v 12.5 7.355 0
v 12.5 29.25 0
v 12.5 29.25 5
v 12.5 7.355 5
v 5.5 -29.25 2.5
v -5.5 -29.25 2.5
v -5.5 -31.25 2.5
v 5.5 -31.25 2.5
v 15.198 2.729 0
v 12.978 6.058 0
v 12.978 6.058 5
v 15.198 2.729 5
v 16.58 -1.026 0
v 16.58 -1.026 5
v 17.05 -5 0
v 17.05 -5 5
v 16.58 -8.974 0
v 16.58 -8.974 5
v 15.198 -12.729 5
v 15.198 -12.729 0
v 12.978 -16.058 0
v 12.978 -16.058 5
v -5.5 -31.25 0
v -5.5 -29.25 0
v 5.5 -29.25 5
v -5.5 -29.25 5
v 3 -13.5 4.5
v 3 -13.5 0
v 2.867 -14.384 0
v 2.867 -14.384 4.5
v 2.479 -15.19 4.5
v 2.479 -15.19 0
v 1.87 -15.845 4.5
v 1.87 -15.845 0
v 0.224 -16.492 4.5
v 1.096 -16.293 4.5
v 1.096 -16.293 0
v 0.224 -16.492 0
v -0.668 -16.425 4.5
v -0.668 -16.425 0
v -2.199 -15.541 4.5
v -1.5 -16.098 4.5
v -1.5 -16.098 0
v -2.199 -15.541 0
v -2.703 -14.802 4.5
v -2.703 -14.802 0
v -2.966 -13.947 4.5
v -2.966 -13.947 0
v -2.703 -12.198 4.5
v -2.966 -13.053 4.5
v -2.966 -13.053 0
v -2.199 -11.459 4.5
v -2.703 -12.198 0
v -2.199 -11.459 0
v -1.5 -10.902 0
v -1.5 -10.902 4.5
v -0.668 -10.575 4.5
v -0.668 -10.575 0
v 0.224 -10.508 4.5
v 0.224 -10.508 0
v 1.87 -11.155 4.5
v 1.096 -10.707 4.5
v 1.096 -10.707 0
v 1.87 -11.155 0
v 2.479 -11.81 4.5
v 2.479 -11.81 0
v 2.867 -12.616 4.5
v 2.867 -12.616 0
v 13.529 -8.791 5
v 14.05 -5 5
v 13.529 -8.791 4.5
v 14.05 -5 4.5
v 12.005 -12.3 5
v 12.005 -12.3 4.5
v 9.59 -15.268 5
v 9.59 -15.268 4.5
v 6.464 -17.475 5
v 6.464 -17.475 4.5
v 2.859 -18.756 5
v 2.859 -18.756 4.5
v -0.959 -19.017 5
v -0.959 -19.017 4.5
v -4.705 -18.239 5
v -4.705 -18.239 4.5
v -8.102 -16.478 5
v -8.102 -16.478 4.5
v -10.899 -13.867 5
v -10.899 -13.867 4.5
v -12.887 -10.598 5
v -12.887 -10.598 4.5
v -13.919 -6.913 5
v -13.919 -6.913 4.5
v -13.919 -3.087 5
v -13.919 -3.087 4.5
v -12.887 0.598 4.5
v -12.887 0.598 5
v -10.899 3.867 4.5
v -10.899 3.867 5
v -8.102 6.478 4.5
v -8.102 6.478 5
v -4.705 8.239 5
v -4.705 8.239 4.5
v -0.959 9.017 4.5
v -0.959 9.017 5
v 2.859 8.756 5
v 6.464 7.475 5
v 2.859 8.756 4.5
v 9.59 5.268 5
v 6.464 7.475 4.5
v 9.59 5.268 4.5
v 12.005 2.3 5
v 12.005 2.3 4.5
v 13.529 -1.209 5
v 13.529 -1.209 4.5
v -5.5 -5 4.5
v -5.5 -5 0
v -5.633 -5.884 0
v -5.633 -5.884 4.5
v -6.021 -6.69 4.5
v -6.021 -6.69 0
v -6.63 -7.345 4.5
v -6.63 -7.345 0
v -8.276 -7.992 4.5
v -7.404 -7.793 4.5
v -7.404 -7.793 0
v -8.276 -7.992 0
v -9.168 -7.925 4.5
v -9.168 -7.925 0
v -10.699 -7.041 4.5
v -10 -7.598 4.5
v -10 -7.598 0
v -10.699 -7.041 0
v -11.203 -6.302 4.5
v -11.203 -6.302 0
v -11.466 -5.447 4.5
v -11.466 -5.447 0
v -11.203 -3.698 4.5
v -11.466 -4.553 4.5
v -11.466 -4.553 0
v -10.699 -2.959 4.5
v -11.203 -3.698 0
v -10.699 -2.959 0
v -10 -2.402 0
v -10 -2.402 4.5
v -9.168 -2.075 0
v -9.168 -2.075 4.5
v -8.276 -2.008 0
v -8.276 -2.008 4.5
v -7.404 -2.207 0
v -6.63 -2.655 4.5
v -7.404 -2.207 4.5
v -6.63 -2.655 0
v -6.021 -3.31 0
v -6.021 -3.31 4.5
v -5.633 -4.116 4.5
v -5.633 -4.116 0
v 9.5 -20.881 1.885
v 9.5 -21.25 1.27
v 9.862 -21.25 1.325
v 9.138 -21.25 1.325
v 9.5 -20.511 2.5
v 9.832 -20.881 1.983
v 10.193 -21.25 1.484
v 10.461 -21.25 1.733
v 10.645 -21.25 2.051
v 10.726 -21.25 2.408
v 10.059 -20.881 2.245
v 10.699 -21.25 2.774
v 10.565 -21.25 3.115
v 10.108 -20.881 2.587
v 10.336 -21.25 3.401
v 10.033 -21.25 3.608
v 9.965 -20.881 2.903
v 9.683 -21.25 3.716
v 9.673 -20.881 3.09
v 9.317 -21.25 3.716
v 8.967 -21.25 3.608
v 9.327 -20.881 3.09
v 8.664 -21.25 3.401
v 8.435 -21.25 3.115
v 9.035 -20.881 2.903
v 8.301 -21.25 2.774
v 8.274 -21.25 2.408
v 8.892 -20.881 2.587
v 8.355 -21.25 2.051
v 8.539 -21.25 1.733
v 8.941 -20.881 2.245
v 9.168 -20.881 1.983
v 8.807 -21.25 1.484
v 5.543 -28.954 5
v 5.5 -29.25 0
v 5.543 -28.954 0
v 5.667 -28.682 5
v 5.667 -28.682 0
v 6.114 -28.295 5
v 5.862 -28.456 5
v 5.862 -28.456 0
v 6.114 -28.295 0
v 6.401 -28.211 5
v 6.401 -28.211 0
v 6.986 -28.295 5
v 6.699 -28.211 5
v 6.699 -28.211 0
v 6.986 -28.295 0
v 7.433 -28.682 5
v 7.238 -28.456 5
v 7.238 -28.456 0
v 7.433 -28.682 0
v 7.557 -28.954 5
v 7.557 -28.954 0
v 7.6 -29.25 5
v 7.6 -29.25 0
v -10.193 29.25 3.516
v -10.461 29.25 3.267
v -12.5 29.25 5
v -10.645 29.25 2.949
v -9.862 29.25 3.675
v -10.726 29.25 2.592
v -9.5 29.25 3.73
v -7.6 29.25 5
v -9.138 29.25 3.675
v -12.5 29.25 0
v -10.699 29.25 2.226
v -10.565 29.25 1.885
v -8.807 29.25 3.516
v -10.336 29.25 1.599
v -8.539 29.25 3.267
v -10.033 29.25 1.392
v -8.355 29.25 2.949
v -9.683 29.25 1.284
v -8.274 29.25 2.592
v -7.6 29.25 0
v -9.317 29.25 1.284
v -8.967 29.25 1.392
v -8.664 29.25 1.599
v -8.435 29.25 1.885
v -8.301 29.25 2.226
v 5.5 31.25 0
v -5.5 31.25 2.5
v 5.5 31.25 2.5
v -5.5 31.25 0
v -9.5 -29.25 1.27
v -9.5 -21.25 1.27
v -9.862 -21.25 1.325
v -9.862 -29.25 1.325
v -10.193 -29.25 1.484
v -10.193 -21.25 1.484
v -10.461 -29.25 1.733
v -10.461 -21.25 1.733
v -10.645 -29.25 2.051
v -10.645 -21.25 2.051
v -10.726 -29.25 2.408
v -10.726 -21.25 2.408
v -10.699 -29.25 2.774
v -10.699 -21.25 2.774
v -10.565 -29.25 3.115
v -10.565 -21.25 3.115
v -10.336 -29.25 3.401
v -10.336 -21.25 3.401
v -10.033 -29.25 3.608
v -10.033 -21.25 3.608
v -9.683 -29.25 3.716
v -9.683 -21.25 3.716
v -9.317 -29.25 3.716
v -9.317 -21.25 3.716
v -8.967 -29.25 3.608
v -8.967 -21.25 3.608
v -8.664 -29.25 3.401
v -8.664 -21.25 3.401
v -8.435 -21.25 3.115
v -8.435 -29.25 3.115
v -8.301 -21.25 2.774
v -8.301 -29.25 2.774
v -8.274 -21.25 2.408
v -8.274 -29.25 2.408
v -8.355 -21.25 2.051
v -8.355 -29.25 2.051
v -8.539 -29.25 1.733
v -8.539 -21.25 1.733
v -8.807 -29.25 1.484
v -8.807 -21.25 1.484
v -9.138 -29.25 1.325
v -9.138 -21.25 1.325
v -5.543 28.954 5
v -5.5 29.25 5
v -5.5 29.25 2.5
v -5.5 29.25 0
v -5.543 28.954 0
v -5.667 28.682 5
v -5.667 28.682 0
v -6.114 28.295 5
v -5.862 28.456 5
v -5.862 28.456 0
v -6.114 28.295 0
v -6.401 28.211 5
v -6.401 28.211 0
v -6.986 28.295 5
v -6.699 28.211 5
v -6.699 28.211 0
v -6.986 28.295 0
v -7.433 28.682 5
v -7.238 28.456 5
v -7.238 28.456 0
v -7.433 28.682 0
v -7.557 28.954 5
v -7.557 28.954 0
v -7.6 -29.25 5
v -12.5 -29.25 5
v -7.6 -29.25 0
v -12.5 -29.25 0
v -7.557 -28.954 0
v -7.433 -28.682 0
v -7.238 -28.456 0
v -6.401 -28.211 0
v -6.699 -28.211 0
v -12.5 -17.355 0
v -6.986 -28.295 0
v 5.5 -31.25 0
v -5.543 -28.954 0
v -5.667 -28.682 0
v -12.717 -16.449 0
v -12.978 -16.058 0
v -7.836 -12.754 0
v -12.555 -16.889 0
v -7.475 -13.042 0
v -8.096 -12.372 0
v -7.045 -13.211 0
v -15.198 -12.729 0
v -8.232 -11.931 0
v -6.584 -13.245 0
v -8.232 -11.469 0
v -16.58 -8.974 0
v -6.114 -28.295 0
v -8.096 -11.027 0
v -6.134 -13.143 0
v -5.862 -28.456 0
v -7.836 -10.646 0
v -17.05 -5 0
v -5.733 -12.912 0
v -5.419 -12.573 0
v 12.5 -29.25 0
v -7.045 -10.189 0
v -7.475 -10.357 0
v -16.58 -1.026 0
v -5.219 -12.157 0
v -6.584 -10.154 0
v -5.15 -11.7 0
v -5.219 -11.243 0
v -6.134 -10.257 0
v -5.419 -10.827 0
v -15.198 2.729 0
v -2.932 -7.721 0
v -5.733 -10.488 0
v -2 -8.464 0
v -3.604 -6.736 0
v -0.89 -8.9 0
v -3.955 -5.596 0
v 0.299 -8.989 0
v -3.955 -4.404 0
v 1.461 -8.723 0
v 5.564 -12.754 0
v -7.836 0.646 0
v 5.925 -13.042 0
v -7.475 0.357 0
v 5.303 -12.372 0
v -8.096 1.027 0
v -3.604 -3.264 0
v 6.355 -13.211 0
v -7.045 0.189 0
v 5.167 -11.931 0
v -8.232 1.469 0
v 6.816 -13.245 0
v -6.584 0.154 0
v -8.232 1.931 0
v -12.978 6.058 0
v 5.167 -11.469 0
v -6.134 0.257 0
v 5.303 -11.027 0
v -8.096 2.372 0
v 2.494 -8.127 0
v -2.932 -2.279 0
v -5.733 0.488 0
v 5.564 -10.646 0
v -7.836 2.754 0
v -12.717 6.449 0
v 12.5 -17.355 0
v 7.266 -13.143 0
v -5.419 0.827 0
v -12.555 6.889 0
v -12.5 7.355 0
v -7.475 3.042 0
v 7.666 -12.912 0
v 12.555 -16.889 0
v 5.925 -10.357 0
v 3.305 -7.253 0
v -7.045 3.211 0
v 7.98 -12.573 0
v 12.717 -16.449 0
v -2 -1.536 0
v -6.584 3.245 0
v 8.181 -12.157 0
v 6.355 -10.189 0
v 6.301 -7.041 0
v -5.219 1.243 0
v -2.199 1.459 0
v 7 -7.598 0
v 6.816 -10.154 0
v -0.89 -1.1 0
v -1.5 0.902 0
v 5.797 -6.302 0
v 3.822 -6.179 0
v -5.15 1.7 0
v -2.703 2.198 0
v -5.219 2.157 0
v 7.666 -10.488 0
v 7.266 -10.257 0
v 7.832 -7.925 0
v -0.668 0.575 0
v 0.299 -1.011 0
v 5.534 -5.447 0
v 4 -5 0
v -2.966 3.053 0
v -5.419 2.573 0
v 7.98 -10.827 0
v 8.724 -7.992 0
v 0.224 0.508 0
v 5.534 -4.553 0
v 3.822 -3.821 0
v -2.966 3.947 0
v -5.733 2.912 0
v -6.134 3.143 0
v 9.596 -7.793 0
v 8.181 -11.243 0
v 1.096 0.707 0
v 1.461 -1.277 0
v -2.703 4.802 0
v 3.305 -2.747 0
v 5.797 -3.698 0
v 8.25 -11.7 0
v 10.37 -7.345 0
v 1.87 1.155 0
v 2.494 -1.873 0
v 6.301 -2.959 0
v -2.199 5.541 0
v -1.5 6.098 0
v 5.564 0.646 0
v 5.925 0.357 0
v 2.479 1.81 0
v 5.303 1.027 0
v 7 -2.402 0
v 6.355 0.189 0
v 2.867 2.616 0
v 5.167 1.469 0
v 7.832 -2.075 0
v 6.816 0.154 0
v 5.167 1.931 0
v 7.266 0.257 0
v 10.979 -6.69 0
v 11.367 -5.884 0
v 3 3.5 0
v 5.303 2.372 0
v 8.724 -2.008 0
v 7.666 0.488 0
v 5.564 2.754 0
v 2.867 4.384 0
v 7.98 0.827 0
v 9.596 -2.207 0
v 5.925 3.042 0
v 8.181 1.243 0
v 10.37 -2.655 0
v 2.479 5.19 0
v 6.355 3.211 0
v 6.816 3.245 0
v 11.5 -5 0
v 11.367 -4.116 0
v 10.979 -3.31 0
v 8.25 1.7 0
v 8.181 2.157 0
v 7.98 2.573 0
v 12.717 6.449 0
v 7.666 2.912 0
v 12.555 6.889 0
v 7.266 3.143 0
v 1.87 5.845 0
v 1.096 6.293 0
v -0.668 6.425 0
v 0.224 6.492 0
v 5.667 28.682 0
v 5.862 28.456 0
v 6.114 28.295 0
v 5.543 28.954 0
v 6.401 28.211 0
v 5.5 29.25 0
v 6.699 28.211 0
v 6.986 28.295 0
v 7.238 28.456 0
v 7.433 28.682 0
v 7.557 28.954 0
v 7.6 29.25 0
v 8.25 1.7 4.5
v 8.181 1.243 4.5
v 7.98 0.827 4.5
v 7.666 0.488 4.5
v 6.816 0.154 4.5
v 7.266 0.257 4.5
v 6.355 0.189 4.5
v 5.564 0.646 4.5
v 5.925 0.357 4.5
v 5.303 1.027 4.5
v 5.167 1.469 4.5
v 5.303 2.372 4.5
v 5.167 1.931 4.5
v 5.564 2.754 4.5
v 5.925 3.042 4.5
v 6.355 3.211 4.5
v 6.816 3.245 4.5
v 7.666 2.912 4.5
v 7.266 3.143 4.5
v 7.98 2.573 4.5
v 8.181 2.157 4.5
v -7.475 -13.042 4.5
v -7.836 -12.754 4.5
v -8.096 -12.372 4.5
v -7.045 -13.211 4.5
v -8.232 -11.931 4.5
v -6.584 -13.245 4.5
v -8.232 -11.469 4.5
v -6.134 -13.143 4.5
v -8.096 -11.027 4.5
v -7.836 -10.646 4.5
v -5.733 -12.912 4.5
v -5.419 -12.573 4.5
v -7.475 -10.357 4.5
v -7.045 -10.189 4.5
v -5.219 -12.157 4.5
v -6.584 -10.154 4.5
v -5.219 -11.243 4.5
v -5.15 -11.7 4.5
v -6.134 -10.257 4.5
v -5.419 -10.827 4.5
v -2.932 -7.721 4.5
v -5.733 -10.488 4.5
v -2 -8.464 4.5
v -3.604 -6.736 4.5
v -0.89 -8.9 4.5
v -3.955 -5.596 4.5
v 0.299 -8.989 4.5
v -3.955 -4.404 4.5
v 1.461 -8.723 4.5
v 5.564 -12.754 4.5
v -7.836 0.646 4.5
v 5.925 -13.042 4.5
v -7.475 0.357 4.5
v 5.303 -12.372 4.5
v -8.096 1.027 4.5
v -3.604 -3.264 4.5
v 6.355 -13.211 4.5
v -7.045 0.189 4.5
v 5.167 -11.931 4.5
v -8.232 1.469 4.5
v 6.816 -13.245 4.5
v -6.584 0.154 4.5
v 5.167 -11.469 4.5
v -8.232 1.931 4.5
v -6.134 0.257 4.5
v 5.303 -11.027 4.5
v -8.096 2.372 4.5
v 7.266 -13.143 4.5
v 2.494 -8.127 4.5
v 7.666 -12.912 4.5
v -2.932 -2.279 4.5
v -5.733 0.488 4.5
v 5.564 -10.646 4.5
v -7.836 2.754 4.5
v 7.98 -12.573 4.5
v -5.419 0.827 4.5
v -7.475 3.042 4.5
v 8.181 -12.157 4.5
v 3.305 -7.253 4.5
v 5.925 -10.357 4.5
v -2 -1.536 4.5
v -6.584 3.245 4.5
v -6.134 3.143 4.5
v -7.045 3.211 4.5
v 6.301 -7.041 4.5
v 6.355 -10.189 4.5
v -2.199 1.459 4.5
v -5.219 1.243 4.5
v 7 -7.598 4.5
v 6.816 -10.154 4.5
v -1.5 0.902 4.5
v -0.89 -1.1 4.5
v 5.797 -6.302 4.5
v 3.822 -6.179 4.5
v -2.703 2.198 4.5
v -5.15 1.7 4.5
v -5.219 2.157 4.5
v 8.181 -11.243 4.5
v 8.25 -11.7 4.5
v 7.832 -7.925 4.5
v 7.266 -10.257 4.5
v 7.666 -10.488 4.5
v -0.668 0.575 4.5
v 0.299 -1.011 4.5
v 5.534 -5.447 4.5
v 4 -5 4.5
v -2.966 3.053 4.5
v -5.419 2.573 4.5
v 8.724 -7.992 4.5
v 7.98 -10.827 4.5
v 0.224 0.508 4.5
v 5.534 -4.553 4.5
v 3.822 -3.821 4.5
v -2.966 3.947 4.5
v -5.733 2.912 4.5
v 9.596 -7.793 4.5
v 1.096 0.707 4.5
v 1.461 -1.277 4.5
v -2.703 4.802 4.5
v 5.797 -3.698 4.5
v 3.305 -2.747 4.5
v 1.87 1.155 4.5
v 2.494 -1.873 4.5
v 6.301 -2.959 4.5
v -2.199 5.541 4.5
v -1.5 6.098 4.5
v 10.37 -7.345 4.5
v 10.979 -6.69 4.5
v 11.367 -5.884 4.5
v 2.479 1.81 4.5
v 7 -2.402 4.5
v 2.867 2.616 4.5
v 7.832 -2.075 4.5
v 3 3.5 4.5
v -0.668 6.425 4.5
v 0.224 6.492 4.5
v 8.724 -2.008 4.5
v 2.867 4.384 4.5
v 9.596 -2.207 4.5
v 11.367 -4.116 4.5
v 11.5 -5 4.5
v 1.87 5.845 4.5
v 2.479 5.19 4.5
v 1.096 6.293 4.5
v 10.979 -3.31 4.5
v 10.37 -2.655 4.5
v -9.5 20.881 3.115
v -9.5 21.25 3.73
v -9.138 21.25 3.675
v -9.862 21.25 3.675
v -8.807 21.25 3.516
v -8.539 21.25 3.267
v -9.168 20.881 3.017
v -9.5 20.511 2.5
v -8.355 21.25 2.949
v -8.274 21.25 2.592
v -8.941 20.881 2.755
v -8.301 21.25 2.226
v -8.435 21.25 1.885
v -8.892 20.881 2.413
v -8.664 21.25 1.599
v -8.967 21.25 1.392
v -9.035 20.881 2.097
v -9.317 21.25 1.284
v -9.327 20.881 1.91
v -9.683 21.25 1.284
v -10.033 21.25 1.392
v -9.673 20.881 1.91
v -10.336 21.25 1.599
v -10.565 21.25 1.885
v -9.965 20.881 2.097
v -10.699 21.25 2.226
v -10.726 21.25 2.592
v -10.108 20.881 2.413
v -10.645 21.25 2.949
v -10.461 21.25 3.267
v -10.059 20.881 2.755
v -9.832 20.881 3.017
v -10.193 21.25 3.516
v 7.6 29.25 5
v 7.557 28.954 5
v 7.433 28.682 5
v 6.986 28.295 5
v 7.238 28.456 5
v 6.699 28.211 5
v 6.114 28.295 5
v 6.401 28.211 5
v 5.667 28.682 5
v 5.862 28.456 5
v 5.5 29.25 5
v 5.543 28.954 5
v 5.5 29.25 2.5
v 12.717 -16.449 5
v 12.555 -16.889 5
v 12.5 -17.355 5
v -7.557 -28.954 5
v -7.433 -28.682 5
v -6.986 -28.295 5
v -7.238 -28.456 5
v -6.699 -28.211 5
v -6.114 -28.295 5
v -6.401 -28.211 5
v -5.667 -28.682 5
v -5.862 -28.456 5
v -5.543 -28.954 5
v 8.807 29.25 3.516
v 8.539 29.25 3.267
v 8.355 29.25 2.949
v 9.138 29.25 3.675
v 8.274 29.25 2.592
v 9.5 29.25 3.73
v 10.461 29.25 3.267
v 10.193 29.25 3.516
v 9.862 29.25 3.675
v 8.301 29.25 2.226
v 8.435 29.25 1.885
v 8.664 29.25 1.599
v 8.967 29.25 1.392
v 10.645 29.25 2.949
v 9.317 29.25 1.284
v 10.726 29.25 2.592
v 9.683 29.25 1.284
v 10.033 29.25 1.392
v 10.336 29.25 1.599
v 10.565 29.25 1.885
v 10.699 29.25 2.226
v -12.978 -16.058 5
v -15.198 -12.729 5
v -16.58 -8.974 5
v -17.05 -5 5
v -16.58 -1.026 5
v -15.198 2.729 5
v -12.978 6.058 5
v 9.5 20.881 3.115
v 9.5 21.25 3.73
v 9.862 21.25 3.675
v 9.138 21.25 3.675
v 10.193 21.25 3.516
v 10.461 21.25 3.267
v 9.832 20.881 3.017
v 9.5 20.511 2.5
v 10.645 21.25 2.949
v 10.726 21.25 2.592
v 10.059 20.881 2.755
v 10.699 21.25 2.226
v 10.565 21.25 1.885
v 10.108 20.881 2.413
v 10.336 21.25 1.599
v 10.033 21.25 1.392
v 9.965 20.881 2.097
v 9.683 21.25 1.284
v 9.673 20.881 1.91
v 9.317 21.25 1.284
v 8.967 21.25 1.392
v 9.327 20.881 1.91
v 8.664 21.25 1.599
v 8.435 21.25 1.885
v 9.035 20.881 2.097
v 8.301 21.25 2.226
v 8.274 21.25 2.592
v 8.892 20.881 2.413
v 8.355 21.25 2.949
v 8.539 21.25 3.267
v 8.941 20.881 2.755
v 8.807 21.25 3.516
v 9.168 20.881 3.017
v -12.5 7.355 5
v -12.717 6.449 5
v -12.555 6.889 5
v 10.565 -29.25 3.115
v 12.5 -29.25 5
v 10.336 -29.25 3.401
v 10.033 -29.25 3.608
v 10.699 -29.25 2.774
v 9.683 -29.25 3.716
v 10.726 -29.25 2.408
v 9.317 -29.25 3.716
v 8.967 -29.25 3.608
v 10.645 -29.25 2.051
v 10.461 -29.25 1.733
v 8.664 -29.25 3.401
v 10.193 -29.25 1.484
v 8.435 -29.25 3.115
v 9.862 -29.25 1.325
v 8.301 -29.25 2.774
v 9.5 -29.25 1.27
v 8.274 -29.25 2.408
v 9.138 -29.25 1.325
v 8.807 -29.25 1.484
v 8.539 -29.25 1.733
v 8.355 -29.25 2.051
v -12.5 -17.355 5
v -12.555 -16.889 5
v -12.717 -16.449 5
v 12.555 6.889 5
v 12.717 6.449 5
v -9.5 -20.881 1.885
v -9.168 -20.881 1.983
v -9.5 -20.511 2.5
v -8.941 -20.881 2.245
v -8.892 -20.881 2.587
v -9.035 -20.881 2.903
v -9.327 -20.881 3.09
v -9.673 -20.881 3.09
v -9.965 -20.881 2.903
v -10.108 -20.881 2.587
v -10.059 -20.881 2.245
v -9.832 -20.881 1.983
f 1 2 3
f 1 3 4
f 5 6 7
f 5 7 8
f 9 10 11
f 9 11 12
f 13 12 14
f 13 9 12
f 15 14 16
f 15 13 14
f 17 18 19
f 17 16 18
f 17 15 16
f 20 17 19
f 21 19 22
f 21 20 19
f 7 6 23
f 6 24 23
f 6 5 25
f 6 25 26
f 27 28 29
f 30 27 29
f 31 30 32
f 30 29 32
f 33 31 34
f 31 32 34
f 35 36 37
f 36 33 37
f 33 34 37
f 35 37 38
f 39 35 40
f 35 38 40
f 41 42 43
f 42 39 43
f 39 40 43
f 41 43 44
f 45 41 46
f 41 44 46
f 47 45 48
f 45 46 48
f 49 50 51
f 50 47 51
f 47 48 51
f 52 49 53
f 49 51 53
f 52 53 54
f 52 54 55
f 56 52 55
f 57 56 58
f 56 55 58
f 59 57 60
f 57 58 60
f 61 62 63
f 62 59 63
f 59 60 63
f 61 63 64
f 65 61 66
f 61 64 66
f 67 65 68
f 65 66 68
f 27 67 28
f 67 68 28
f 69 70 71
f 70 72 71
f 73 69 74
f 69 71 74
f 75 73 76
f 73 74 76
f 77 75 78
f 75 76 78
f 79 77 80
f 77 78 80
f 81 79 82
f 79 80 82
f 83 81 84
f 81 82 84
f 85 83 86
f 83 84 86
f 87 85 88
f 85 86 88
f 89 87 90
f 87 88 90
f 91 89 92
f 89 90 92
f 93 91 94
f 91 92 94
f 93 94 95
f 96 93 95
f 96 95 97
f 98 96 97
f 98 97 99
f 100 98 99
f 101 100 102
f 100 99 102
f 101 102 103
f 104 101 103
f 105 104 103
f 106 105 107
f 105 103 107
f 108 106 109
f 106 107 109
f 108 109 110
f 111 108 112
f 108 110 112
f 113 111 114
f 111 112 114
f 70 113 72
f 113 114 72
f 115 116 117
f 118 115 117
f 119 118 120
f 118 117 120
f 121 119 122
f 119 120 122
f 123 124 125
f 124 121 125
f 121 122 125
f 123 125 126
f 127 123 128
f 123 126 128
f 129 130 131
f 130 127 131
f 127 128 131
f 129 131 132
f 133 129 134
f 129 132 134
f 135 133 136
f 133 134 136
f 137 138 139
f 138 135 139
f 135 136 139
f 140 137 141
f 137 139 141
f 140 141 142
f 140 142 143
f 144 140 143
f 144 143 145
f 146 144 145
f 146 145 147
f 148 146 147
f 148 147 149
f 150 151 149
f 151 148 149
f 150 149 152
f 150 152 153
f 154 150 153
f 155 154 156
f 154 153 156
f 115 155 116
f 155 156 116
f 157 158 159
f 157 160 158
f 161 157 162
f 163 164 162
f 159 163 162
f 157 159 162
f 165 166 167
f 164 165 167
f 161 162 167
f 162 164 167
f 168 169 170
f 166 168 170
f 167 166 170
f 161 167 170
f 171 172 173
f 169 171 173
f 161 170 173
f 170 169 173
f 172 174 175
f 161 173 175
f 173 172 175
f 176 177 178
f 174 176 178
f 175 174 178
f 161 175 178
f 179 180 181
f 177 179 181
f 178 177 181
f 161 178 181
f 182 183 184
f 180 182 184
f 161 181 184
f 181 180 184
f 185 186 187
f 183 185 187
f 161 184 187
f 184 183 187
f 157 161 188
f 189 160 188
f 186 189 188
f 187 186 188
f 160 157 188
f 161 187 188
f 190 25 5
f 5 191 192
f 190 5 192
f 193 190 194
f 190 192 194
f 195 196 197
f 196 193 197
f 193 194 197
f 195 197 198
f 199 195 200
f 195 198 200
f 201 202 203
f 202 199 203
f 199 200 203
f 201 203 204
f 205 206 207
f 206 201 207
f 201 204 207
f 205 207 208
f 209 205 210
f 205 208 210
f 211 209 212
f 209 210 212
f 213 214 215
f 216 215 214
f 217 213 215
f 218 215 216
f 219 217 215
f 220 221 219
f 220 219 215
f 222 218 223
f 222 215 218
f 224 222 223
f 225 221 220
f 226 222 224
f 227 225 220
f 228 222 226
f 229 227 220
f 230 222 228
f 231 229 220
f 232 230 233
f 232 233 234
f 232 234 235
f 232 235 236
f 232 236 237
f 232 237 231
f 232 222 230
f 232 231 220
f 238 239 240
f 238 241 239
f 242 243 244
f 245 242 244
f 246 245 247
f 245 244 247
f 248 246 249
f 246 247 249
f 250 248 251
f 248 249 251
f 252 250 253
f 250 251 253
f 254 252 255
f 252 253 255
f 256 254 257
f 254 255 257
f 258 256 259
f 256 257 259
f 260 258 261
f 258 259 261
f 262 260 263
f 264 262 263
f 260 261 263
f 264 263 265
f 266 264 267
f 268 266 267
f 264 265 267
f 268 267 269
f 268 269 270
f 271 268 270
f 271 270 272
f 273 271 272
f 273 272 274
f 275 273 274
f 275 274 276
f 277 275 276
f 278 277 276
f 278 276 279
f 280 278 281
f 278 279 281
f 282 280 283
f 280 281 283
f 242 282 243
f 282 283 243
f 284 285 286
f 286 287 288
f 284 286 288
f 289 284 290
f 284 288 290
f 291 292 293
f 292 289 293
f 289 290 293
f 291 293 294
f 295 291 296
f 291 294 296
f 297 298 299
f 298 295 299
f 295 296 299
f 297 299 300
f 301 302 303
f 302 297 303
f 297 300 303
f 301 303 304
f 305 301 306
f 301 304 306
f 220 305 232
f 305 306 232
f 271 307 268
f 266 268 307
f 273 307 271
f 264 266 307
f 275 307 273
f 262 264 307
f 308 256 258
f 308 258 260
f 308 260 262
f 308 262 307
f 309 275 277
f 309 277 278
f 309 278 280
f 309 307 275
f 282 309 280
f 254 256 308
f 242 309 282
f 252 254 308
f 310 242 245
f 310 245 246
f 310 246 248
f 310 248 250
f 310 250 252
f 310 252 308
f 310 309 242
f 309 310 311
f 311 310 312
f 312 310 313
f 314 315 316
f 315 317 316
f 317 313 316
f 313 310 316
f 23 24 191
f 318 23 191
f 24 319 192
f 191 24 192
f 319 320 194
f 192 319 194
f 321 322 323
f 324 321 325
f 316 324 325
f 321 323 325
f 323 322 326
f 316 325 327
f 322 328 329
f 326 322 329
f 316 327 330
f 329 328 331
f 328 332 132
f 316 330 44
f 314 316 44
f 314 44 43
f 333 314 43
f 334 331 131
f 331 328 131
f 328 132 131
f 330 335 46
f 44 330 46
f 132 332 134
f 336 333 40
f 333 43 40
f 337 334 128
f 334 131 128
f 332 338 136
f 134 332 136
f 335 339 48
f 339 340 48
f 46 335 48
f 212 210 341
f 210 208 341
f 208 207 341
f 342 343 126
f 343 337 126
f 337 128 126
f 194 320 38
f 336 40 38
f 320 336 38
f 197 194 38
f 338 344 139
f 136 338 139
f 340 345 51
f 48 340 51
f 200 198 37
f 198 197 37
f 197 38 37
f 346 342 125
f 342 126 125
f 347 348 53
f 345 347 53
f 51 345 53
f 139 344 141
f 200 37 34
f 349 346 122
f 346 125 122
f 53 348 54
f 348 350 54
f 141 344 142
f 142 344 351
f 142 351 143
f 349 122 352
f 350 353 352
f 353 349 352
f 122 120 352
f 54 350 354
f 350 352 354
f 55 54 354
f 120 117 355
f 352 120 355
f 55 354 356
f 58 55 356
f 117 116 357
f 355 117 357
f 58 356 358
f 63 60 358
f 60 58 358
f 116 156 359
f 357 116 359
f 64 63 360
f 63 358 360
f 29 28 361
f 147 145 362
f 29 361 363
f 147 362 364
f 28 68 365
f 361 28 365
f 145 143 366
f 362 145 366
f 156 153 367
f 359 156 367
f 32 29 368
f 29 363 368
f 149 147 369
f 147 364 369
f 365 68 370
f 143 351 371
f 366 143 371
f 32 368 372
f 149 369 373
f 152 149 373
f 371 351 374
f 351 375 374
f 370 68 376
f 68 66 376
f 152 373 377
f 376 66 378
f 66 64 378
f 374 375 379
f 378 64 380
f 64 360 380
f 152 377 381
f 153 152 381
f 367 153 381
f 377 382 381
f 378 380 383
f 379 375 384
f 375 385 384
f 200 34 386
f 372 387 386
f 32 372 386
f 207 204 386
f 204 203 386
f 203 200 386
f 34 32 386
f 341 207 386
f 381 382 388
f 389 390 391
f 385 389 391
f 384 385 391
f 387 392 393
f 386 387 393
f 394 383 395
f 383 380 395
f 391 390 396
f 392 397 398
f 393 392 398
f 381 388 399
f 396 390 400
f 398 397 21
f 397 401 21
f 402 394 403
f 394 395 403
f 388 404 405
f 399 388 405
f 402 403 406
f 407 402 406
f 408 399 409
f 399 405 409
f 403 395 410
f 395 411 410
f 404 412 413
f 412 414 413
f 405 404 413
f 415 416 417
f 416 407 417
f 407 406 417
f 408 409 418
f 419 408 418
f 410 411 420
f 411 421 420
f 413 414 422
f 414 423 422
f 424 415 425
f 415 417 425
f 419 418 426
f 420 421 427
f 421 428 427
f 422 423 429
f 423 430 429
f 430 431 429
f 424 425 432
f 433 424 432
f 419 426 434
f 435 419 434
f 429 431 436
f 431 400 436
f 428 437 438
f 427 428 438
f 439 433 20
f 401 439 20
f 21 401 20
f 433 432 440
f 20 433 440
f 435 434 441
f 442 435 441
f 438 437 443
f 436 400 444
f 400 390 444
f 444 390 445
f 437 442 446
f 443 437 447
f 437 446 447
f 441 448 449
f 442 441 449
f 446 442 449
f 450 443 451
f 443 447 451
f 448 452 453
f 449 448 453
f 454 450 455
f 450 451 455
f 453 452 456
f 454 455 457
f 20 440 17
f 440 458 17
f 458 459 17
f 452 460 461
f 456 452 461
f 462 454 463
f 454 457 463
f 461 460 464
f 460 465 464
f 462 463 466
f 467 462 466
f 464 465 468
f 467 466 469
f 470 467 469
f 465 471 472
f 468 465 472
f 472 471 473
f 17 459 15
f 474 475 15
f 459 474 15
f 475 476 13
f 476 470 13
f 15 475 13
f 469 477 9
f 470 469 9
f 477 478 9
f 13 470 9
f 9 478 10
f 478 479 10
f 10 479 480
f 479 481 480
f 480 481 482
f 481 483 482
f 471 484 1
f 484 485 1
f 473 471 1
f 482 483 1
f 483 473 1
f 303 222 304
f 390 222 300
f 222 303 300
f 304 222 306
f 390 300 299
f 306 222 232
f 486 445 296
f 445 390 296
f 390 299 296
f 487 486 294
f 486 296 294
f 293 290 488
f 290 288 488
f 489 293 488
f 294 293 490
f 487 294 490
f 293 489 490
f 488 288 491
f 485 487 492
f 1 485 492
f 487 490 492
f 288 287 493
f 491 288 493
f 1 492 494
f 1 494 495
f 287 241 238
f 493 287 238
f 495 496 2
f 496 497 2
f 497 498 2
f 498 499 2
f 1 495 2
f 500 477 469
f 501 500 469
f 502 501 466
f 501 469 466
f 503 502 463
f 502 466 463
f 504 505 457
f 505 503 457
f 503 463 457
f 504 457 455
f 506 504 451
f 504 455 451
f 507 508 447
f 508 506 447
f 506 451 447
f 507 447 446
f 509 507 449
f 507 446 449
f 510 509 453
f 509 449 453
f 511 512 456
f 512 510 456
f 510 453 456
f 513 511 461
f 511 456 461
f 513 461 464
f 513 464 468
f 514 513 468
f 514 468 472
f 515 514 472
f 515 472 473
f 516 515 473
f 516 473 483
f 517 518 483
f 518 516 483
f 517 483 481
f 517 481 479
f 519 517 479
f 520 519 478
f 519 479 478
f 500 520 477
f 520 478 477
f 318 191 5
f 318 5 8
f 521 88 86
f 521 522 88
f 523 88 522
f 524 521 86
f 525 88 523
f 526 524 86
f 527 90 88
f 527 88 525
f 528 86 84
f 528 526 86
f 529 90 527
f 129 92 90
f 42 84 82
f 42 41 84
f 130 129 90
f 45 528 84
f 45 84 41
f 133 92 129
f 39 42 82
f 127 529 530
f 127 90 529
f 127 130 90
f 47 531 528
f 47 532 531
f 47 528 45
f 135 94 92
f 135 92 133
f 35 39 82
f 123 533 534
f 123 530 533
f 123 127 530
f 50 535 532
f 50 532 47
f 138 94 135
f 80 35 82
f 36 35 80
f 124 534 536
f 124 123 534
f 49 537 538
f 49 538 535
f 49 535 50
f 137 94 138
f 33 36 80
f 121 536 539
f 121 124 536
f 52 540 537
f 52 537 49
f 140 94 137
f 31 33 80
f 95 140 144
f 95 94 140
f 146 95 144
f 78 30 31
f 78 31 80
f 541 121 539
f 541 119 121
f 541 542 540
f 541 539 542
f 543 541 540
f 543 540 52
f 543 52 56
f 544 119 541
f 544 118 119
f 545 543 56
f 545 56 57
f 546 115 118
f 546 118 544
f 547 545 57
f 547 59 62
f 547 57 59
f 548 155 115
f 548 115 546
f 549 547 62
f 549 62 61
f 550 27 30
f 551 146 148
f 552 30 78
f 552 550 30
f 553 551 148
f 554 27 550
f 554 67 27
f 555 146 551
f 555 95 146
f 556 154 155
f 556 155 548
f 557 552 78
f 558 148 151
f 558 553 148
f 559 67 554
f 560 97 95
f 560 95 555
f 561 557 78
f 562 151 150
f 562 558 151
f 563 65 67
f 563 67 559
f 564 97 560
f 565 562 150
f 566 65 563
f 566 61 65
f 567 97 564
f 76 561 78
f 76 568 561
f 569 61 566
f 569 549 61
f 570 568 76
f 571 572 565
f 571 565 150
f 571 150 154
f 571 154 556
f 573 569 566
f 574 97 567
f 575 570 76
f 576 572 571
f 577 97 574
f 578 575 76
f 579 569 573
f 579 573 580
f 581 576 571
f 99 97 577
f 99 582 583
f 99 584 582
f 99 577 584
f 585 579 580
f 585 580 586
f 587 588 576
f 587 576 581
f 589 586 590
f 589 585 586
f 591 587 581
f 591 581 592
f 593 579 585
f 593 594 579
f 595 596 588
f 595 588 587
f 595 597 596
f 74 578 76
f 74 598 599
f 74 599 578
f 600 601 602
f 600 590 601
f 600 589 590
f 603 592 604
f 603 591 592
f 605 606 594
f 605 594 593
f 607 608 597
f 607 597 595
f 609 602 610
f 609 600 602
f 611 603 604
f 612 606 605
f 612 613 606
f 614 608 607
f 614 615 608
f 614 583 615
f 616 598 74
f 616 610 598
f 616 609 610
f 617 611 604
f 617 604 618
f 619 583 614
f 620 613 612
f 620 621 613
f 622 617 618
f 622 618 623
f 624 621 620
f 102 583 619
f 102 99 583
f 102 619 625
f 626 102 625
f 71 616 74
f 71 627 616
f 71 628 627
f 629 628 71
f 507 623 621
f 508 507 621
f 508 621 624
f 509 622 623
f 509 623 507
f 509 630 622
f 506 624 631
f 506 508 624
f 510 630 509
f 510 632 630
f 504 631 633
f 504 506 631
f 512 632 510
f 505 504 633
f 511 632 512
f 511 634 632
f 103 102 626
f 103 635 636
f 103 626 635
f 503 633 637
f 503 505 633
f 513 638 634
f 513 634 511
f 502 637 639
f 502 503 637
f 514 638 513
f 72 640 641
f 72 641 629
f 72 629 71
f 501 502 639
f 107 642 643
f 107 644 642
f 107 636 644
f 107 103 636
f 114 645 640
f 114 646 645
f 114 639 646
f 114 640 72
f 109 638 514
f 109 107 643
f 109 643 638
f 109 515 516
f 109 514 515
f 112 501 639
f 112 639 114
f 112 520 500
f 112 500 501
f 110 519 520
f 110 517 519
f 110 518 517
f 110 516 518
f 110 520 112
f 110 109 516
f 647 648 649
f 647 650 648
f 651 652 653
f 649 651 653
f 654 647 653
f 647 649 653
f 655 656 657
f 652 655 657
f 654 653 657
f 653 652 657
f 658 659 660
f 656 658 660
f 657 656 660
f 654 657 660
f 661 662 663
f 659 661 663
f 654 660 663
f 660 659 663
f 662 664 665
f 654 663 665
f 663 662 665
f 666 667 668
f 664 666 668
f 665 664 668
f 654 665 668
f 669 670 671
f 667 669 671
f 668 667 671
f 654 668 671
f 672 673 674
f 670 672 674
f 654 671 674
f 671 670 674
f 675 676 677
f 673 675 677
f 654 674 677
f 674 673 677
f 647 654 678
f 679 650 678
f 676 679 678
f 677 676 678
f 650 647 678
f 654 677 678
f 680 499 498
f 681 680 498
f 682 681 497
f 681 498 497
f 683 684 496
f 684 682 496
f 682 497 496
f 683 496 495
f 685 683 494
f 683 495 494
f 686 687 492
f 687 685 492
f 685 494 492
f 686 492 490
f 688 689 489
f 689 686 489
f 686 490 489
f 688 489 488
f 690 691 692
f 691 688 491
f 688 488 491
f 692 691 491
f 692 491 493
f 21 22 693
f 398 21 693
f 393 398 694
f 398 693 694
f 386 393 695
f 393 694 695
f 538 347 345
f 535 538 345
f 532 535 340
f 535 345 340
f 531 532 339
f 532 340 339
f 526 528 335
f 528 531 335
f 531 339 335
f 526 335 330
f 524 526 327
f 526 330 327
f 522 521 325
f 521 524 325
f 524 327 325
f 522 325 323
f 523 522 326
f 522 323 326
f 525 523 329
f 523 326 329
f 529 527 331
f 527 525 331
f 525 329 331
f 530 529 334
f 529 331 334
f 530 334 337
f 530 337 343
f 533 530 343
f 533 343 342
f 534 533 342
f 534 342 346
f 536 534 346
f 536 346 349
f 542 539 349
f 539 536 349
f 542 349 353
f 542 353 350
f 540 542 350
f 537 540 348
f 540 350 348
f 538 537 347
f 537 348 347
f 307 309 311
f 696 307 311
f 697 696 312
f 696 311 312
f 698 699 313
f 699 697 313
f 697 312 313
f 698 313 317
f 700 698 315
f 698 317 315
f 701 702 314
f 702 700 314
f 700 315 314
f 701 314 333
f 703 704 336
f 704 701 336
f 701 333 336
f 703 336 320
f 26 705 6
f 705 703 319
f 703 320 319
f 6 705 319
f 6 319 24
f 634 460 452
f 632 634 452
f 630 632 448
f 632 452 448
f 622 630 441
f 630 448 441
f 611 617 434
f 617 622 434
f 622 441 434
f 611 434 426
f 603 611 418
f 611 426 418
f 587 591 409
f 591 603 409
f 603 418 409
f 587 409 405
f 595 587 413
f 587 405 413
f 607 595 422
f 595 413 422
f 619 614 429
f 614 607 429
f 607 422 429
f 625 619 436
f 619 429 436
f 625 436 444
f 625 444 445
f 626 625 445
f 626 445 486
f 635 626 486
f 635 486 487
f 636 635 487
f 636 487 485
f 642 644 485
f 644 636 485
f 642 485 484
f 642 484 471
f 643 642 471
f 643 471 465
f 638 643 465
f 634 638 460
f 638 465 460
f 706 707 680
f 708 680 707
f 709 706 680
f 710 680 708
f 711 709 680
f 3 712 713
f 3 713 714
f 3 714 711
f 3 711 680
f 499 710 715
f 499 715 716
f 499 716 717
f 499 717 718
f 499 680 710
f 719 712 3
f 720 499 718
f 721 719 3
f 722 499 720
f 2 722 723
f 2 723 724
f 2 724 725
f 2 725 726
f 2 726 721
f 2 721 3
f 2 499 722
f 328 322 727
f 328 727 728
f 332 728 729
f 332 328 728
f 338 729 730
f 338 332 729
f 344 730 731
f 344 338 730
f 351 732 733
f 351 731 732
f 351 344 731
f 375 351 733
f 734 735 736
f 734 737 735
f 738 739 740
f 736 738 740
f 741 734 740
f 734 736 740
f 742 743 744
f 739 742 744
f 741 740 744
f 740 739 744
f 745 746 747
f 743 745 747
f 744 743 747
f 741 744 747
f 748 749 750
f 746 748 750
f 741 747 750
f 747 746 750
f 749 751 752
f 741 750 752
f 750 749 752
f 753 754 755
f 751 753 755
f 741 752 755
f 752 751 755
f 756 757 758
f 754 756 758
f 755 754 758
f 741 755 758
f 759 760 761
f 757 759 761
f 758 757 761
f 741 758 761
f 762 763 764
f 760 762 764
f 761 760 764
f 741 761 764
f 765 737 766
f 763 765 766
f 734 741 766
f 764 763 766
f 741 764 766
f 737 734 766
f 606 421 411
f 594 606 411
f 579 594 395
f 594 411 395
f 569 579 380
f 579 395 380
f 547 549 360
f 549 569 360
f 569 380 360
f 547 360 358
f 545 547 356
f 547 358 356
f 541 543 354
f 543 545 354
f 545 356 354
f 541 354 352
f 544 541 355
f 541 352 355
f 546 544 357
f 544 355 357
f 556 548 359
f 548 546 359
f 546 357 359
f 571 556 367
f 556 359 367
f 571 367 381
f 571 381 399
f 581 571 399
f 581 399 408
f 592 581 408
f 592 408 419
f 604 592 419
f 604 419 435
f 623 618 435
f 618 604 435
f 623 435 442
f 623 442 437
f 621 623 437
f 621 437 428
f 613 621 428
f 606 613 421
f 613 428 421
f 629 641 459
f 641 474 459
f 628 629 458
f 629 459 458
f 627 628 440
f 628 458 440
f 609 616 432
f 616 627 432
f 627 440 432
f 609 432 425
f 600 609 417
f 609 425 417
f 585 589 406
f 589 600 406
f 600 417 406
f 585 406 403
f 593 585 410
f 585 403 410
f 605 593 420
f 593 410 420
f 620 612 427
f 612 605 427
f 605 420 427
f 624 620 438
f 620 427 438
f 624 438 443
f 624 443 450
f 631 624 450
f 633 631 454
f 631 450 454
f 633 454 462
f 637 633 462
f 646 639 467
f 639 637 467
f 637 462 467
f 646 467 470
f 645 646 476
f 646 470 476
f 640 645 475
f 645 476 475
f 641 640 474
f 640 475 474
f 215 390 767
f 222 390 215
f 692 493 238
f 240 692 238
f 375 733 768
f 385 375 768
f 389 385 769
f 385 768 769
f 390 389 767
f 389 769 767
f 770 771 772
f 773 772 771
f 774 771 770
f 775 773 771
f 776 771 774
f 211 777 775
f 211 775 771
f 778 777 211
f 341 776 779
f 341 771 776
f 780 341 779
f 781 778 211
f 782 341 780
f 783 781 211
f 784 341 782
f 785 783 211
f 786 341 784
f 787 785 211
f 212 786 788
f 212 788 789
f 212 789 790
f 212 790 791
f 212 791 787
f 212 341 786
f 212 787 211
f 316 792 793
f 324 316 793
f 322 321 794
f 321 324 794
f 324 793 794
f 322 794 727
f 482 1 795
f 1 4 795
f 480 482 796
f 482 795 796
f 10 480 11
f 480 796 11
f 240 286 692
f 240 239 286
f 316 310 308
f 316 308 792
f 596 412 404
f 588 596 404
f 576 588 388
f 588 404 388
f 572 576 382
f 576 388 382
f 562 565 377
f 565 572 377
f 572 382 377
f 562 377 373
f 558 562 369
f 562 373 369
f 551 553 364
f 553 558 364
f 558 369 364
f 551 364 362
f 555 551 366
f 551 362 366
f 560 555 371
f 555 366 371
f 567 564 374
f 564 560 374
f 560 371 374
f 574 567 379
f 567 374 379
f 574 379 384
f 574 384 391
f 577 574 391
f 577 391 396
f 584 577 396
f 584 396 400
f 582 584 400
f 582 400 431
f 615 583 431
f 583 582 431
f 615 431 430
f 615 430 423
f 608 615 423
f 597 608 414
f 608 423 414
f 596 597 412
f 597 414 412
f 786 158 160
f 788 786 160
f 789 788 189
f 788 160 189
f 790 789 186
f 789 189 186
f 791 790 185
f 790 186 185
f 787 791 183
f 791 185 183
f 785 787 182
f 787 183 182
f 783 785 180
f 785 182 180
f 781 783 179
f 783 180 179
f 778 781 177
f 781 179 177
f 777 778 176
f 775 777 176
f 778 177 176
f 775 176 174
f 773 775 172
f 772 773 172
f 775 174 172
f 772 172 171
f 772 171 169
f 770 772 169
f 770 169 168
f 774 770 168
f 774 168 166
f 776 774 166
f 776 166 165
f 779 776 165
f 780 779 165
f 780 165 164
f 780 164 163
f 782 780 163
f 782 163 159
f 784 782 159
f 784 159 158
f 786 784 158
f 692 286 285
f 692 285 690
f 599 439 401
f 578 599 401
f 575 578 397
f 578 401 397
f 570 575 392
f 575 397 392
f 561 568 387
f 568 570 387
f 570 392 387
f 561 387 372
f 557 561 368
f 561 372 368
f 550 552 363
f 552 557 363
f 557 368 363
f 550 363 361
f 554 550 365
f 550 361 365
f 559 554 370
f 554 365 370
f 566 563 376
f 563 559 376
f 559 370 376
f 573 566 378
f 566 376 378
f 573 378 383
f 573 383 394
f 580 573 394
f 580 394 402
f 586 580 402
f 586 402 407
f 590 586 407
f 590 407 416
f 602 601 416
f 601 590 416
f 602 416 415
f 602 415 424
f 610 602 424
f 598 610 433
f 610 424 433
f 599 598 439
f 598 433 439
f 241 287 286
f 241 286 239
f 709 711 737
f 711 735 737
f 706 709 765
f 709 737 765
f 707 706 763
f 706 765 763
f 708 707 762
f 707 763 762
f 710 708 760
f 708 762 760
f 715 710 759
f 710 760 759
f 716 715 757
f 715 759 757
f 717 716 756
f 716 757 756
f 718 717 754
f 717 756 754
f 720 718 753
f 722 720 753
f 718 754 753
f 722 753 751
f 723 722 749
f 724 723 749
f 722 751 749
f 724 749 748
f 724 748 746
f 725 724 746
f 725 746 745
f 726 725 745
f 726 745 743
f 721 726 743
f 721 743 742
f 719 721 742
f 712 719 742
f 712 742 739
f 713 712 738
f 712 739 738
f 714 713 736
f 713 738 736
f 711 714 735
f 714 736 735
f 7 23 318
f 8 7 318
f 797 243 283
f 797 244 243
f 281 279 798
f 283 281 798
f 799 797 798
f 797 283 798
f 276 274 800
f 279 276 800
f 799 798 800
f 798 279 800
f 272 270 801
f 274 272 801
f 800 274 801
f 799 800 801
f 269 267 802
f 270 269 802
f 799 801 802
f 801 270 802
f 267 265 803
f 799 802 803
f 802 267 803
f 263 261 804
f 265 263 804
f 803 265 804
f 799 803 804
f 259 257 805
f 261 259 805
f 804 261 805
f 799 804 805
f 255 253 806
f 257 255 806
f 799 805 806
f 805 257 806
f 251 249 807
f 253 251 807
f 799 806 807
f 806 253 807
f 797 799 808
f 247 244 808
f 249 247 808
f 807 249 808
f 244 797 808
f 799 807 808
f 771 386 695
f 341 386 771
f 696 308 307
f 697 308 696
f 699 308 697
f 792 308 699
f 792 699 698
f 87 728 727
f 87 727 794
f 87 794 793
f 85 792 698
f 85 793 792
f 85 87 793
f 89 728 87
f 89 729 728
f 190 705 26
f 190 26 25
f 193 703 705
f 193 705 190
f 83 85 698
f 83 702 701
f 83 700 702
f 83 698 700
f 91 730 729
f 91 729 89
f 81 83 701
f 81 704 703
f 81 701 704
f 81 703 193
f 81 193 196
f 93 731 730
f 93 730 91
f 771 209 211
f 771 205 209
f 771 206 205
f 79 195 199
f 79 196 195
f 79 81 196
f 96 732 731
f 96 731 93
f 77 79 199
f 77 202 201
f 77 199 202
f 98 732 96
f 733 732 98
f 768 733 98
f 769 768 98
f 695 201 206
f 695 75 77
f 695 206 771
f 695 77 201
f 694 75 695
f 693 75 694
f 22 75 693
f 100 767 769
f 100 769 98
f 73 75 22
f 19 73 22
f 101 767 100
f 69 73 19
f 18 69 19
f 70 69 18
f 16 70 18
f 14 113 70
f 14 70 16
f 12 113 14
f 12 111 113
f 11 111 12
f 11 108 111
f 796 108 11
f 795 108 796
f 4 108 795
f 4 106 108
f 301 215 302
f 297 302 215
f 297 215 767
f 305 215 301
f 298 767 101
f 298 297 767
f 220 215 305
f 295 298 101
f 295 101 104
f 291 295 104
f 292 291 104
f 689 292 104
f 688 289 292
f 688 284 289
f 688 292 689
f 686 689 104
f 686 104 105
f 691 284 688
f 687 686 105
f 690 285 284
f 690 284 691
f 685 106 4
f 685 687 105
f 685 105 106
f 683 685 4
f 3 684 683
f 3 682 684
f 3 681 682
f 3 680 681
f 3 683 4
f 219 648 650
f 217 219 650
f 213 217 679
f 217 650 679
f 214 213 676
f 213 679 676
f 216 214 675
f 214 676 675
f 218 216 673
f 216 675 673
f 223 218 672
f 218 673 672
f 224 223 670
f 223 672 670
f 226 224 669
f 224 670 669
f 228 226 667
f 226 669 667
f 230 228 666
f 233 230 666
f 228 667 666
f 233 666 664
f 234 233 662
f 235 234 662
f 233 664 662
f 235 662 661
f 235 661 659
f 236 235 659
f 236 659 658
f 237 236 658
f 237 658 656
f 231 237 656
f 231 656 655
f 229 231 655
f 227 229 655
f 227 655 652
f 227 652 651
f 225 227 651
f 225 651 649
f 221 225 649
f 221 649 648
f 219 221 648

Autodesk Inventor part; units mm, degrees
ref_plane "YZ Plane" through (0, 0, 0) normal (1, 0, 0) x (0, 1, 0)
ref_plane "XZ Plane" through (0, 0, 0) normal (0, 1, 0) x (-1, 0, 0)
ref_plane "XY Plane" through (0, 0, 0) normal (0, 0, 1) x (1, 0, 0)
sketch "スケッチ1" plane through (0, 0, 0) normal (0, 0, 1) x (1, 0, 0)
  line L0 (-12.5, 29.25) -> (12.5, 29.25)
  line L1 (12.5, 29.25) -> (12.5, -29.25)
  line L2 (12.5, -29.25) -> (-12.5, -29.25)
  line L3 (-12.5, -29.25) -> (-12.5, 29.25)
  line L4 (-12.5, 29.25) -> (12.5, -29.25) construction
  line L5 (12.5, 29.25) -> (-12.5, -29.25) construction
  line L6 (-5.5, 29.25) -> (-5.5, 31.25)
  line L7 (-5.5, 31.25) -> (5.5, 31.25)
  line L8 (0, 29.25) -> (0, -29.25) construction
  line L9 (5.5, 29.25) -> (5.5, 31.25)
  arc A0 (-7.6, 29.25) -> (-5.5, 29.25) centre (-6.55, 29.25) ccw
  arc A1 (5.5, 29.25) -> (7.6, 29.25) centre (6.55, 29.25) ccw
  line L10 (-12.5, 0) -> (12.5, 0) construction
  line L11 (-5.5, -29.25) -> (-5.5, -31.25)
  line L12 (-5.5, -31.25) -> (5.5, -31.25)
  line L13 (5.5, -29.25) -> (5.5, -31.25)
  arc A2 (-5.5, -29.25) -> (-7.6, -29.25) centre (-6.55, -29.25) ccw
  arc A3 (7.6, -29.25) -> (5.5, -29.25) centre (6.55, -29.25) ccw
  circle A4 centre (0, -5) radius 13.95 construction
  circle A5 centre (0, -5) radius 14.05
  circle A6 centre (-6.6998, -11.6998) radius 1.55
  line L14 (-9.9349, -14.9349) -> (0, -5) construction
  circle A7 centre (6.6998, -11.6998) radius 1.55
  circle A8 centre (6.6998, 1.6998) radius 1.55
  circle A9 centre (-6.6998, 1.6998) radius 1.55
  circle A10 centre (0, -5) radius 4
  circle A11 centre (0, -13.5) radius 3
  circle A12 centre (8.5, -5) radius 3
  circle A13 centre (0, 3.5) radius 3
  circle A14 centre (-8.5, -5) radius 3
  arc A15 (-10.6051, 8.3504) -> (-12.5, -16.5954) centre (0, -5) ccw
  arc A16 (12.5, -16.5954) -> (10.6051, 8.3504) centre (0, -5) ccw
  point P0 (0, 0)
  point P1 (-5.5, -29.25)
  point P2 (5.5, -29.25)
  point P3 (7.6, 29.25)
  point P4 (5.5, -29.25)
  point P5 (-5.5, -29.25)
  point P6 (-12.5, 1.415)
  point P7 (12.5, 1.415)
  point P8 (12.5, -11.415)
  point P9 (-12.5, -11.415)
  point P10 (12.5, -16.5954)
  point P11 (12.5, 6.5954)
  point P12 (-12.5, 6.5954)
  dimension "d0" = 25
  dimension "d1" = 58.5
  dimension "d2" = 11
  dimension "d3" = 2
  dimension "d4" = 1.05
  dimension "d13" = 27.9
  dimension "d17" = 24.25
  dimension "d44" = 0.1
  dimension "d48" = 3.1
  dimension "d49" = 45
  dimension "d50" = 9.475
  dimension "d53" = 360
  dimension "d55" = 8
  dimension "d56" = 6
  dimension "d57" = 8.5
  dimension "d60" = 360
  dimension "d64" = 3
extrude "押し出し1" add sketch "スケッチ1" along normal blind 5 contours L0 A0 A1 L1 A5 L3 | L3 A5 A15 | L3 A5 L1 L2 A3 A2 | L1 A16 A5
extrude "押し出し2" add sketch "スケッチ1" along normal blind 2.5 contours L6 L7 L9 L0 | L2 L13 L12 L11
sketch "スケッチ2" plane through (-12.5, -29.25, 0) normal (0, -1, 0) x (1, 0, 0)
  line L0 (0, 0) -> (4.9, 0) projected
  line L1 (12.5, 5) -> (12.5, 0) construction
  line L2 (0, 0) -> (25, 0) projected
  line L3 (0, 5) -> (25, 5) projected
  point P0 (3, 2.5)
  point P1 (22, 2.5)
  point P2 (20.1, 0)
  point P3 (7, 5)
  point P4 (18, 5)
  point P5 (7, 0)
  dimension "d26" = 2.5
  dimension "d27" = 19
hole "穴1" at (-9.5, -29.25, 2.5) at (9.5, -29.25, 2.5) direction (0, 1, 0) diameter 2.459 depth 8 tip angle 118 thread size "M3x0.5" class "6H" standard "ISO Metric profile"
sketch "スケッチ3" plane through (-12.5, 29.25, 0) normal (0, 1, 0) x (1, 0, 0)
  circle A0 centre (22, -2.5) radius 1.2295 projected
  circle A1 centre (3, -2.5) radius 1.2295 projected
  point P0 (12.5, 0)
hole "穴2" at (9.5, 29.25, 2.5) at (-9.5, 29.25, 2.5) direction (0, -1, 0) diameter 2.459 depth 8 tip angle 118 thread size "M3x0.5" class "6H" standard "ISO Metric profile"
extrude "押し出し3" add sketch "スケッチ1" along normal blind 4.5 contours A5 L1 L3 | L3 A5 | A5 L1
fillet "フィレット3" radius 2 4 edges at (-12.5, -16.5954, 2.5) (-12.5, 6.5954, 2.5) (12.5, 6.5954, 2.5) (12.5, -16.5954, 2.5)
properties part number "Leg_joint_basis_frame" material "アルミニウム 2014-T4"
